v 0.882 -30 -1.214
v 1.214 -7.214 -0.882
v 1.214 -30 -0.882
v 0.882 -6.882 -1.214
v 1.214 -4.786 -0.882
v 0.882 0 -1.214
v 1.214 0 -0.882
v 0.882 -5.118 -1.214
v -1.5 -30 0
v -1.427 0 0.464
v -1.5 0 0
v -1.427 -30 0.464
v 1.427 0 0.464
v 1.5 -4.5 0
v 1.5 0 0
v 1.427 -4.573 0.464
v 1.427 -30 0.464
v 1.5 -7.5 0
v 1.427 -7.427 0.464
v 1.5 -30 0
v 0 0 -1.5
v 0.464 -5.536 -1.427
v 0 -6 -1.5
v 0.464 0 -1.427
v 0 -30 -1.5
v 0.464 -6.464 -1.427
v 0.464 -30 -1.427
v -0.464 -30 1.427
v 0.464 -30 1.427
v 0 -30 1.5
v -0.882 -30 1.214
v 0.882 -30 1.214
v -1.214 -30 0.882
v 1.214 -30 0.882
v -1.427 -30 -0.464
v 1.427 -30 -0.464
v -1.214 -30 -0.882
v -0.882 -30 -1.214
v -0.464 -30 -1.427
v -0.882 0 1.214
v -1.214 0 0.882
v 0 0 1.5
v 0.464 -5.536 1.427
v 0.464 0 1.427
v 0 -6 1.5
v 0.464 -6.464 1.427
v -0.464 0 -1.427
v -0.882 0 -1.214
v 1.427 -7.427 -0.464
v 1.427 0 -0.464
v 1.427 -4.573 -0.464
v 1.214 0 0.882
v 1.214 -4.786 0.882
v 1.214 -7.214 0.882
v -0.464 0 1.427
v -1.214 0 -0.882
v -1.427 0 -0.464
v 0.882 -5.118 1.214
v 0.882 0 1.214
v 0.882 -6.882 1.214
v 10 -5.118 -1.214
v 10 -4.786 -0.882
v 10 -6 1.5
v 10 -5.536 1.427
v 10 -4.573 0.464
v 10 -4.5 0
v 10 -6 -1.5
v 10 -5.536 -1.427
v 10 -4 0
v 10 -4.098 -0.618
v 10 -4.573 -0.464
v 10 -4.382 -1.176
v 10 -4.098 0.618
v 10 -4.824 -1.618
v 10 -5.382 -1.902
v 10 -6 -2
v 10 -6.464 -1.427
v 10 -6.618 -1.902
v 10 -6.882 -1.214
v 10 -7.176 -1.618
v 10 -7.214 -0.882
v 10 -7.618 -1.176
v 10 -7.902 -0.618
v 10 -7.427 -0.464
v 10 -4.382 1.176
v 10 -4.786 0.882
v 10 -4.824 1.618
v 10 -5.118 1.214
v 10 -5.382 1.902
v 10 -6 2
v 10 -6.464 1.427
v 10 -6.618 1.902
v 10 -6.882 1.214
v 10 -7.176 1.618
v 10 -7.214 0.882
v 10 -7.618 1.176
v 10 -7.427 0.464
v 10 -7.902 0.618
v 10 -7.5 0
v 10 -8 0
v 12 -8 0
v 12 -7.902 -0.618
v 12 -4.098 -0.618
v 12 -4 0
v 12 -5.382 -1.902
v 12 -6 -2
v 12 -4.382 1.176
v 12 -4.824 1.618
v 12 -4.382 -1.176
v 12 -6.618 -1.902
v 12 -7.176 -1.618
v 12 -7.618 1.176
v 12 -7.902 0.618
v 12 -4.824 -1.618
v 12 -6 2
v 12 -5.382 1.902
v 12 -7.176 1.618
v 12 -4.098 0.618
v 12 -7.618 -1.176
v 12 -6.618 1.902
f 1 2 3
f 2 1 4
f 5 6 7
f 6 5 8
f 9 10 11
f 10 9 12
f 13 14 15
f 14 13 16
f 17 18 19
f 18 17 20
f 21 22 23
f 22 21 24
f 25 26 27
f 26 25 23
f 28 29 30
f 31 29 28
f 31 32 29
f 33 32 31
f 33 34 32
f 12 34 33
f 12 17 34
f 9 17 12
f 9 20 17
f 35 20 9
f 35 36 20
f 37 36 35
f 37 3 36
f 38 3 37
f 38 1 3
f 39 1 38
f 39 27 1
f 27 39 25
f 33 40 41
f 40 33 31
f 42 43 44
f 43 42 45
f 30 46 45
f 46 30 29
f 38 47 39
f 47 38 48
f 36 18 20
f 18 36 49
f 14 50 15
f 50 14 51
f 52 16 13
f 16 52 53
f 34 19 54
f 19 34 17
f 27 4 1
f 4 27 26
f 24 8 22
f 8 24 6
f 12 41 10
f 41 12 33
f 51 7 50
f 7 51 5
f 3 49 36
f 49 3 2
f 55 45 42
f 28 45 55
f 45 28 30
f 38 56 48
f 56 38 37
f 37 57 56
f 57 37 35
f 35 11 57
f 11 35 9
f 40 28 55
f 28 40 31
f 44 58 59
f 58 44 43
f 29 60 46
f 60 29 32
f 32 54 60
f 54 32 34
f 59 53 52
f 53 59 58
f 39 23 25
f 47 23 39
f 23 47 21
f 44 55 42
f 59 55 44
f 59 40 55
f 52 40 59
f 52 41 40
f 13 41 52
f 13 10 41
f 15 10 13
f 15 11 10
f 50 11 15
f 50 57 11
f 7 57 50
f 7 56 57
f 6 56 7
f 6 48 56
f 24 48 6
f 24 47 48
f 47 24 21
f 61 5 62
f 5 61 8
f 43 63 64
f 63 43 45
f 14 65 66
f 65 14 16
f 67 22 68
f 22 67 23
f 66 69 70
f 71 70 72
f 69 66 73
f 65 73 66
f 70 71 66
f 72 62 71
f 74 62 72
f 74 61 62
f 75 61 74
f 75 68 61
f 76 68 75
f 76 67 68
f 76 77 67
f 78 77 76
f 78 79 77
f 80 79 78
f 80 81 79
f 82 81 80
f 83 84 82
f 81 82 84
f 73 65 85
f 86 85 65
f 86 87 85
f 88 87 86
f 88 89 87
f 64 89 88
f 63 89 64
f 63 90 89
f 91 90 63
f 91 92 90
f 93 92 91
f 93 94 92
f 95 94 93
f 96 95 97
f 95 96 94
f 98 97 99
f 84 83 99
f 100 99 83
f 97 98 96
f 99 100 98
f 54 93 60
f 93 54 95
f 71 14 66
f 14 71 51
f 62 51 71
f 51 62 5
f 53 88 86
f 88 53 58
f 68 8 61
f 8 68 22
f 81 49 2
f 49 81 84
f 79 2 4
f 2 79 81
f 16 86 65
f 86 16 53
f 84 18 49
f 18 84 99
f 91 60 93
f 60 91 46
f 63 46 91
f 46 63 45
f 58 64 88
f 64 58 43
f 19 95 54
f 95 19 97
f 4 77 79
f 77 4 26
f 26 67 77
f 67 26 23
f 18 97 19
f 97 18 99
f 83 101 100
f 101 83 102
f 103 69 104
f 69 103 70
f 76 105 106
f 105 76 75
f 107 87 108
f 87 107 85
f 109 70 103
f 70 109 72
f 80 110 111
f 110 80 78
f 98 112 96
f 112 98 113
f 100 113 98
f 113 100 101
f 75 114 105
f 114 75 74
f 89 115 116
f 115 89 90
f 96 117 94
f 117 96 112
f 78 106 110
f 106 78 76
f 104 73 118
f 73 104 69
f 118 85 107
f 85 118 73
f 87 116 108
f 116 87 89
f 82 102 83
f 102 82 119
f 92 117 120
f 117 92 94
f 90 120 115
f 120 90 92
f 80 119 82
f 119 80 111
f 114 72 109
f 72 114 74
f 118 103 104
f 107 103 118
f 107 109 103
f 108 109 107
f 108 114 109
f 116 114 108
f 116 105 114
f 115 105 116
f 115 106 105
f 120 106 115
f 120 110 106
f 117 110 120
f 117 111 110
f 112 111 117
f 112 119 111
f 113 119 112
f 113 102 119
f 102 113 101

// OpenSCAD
echo(version=version());
 
length = 30; 

color("grey")
rotate([90,90,0])
   cylinder(h=length, r=1.5,$fn=20);

translate([0, -6, 0]) 
rotate([90,90,90])
cylinder(h=10, r=1.5 ,$fn=20);

translate([10, -6, 0]) 
rotate([90,90,90])
cylinder(h=2, r=2,$fn=20);
